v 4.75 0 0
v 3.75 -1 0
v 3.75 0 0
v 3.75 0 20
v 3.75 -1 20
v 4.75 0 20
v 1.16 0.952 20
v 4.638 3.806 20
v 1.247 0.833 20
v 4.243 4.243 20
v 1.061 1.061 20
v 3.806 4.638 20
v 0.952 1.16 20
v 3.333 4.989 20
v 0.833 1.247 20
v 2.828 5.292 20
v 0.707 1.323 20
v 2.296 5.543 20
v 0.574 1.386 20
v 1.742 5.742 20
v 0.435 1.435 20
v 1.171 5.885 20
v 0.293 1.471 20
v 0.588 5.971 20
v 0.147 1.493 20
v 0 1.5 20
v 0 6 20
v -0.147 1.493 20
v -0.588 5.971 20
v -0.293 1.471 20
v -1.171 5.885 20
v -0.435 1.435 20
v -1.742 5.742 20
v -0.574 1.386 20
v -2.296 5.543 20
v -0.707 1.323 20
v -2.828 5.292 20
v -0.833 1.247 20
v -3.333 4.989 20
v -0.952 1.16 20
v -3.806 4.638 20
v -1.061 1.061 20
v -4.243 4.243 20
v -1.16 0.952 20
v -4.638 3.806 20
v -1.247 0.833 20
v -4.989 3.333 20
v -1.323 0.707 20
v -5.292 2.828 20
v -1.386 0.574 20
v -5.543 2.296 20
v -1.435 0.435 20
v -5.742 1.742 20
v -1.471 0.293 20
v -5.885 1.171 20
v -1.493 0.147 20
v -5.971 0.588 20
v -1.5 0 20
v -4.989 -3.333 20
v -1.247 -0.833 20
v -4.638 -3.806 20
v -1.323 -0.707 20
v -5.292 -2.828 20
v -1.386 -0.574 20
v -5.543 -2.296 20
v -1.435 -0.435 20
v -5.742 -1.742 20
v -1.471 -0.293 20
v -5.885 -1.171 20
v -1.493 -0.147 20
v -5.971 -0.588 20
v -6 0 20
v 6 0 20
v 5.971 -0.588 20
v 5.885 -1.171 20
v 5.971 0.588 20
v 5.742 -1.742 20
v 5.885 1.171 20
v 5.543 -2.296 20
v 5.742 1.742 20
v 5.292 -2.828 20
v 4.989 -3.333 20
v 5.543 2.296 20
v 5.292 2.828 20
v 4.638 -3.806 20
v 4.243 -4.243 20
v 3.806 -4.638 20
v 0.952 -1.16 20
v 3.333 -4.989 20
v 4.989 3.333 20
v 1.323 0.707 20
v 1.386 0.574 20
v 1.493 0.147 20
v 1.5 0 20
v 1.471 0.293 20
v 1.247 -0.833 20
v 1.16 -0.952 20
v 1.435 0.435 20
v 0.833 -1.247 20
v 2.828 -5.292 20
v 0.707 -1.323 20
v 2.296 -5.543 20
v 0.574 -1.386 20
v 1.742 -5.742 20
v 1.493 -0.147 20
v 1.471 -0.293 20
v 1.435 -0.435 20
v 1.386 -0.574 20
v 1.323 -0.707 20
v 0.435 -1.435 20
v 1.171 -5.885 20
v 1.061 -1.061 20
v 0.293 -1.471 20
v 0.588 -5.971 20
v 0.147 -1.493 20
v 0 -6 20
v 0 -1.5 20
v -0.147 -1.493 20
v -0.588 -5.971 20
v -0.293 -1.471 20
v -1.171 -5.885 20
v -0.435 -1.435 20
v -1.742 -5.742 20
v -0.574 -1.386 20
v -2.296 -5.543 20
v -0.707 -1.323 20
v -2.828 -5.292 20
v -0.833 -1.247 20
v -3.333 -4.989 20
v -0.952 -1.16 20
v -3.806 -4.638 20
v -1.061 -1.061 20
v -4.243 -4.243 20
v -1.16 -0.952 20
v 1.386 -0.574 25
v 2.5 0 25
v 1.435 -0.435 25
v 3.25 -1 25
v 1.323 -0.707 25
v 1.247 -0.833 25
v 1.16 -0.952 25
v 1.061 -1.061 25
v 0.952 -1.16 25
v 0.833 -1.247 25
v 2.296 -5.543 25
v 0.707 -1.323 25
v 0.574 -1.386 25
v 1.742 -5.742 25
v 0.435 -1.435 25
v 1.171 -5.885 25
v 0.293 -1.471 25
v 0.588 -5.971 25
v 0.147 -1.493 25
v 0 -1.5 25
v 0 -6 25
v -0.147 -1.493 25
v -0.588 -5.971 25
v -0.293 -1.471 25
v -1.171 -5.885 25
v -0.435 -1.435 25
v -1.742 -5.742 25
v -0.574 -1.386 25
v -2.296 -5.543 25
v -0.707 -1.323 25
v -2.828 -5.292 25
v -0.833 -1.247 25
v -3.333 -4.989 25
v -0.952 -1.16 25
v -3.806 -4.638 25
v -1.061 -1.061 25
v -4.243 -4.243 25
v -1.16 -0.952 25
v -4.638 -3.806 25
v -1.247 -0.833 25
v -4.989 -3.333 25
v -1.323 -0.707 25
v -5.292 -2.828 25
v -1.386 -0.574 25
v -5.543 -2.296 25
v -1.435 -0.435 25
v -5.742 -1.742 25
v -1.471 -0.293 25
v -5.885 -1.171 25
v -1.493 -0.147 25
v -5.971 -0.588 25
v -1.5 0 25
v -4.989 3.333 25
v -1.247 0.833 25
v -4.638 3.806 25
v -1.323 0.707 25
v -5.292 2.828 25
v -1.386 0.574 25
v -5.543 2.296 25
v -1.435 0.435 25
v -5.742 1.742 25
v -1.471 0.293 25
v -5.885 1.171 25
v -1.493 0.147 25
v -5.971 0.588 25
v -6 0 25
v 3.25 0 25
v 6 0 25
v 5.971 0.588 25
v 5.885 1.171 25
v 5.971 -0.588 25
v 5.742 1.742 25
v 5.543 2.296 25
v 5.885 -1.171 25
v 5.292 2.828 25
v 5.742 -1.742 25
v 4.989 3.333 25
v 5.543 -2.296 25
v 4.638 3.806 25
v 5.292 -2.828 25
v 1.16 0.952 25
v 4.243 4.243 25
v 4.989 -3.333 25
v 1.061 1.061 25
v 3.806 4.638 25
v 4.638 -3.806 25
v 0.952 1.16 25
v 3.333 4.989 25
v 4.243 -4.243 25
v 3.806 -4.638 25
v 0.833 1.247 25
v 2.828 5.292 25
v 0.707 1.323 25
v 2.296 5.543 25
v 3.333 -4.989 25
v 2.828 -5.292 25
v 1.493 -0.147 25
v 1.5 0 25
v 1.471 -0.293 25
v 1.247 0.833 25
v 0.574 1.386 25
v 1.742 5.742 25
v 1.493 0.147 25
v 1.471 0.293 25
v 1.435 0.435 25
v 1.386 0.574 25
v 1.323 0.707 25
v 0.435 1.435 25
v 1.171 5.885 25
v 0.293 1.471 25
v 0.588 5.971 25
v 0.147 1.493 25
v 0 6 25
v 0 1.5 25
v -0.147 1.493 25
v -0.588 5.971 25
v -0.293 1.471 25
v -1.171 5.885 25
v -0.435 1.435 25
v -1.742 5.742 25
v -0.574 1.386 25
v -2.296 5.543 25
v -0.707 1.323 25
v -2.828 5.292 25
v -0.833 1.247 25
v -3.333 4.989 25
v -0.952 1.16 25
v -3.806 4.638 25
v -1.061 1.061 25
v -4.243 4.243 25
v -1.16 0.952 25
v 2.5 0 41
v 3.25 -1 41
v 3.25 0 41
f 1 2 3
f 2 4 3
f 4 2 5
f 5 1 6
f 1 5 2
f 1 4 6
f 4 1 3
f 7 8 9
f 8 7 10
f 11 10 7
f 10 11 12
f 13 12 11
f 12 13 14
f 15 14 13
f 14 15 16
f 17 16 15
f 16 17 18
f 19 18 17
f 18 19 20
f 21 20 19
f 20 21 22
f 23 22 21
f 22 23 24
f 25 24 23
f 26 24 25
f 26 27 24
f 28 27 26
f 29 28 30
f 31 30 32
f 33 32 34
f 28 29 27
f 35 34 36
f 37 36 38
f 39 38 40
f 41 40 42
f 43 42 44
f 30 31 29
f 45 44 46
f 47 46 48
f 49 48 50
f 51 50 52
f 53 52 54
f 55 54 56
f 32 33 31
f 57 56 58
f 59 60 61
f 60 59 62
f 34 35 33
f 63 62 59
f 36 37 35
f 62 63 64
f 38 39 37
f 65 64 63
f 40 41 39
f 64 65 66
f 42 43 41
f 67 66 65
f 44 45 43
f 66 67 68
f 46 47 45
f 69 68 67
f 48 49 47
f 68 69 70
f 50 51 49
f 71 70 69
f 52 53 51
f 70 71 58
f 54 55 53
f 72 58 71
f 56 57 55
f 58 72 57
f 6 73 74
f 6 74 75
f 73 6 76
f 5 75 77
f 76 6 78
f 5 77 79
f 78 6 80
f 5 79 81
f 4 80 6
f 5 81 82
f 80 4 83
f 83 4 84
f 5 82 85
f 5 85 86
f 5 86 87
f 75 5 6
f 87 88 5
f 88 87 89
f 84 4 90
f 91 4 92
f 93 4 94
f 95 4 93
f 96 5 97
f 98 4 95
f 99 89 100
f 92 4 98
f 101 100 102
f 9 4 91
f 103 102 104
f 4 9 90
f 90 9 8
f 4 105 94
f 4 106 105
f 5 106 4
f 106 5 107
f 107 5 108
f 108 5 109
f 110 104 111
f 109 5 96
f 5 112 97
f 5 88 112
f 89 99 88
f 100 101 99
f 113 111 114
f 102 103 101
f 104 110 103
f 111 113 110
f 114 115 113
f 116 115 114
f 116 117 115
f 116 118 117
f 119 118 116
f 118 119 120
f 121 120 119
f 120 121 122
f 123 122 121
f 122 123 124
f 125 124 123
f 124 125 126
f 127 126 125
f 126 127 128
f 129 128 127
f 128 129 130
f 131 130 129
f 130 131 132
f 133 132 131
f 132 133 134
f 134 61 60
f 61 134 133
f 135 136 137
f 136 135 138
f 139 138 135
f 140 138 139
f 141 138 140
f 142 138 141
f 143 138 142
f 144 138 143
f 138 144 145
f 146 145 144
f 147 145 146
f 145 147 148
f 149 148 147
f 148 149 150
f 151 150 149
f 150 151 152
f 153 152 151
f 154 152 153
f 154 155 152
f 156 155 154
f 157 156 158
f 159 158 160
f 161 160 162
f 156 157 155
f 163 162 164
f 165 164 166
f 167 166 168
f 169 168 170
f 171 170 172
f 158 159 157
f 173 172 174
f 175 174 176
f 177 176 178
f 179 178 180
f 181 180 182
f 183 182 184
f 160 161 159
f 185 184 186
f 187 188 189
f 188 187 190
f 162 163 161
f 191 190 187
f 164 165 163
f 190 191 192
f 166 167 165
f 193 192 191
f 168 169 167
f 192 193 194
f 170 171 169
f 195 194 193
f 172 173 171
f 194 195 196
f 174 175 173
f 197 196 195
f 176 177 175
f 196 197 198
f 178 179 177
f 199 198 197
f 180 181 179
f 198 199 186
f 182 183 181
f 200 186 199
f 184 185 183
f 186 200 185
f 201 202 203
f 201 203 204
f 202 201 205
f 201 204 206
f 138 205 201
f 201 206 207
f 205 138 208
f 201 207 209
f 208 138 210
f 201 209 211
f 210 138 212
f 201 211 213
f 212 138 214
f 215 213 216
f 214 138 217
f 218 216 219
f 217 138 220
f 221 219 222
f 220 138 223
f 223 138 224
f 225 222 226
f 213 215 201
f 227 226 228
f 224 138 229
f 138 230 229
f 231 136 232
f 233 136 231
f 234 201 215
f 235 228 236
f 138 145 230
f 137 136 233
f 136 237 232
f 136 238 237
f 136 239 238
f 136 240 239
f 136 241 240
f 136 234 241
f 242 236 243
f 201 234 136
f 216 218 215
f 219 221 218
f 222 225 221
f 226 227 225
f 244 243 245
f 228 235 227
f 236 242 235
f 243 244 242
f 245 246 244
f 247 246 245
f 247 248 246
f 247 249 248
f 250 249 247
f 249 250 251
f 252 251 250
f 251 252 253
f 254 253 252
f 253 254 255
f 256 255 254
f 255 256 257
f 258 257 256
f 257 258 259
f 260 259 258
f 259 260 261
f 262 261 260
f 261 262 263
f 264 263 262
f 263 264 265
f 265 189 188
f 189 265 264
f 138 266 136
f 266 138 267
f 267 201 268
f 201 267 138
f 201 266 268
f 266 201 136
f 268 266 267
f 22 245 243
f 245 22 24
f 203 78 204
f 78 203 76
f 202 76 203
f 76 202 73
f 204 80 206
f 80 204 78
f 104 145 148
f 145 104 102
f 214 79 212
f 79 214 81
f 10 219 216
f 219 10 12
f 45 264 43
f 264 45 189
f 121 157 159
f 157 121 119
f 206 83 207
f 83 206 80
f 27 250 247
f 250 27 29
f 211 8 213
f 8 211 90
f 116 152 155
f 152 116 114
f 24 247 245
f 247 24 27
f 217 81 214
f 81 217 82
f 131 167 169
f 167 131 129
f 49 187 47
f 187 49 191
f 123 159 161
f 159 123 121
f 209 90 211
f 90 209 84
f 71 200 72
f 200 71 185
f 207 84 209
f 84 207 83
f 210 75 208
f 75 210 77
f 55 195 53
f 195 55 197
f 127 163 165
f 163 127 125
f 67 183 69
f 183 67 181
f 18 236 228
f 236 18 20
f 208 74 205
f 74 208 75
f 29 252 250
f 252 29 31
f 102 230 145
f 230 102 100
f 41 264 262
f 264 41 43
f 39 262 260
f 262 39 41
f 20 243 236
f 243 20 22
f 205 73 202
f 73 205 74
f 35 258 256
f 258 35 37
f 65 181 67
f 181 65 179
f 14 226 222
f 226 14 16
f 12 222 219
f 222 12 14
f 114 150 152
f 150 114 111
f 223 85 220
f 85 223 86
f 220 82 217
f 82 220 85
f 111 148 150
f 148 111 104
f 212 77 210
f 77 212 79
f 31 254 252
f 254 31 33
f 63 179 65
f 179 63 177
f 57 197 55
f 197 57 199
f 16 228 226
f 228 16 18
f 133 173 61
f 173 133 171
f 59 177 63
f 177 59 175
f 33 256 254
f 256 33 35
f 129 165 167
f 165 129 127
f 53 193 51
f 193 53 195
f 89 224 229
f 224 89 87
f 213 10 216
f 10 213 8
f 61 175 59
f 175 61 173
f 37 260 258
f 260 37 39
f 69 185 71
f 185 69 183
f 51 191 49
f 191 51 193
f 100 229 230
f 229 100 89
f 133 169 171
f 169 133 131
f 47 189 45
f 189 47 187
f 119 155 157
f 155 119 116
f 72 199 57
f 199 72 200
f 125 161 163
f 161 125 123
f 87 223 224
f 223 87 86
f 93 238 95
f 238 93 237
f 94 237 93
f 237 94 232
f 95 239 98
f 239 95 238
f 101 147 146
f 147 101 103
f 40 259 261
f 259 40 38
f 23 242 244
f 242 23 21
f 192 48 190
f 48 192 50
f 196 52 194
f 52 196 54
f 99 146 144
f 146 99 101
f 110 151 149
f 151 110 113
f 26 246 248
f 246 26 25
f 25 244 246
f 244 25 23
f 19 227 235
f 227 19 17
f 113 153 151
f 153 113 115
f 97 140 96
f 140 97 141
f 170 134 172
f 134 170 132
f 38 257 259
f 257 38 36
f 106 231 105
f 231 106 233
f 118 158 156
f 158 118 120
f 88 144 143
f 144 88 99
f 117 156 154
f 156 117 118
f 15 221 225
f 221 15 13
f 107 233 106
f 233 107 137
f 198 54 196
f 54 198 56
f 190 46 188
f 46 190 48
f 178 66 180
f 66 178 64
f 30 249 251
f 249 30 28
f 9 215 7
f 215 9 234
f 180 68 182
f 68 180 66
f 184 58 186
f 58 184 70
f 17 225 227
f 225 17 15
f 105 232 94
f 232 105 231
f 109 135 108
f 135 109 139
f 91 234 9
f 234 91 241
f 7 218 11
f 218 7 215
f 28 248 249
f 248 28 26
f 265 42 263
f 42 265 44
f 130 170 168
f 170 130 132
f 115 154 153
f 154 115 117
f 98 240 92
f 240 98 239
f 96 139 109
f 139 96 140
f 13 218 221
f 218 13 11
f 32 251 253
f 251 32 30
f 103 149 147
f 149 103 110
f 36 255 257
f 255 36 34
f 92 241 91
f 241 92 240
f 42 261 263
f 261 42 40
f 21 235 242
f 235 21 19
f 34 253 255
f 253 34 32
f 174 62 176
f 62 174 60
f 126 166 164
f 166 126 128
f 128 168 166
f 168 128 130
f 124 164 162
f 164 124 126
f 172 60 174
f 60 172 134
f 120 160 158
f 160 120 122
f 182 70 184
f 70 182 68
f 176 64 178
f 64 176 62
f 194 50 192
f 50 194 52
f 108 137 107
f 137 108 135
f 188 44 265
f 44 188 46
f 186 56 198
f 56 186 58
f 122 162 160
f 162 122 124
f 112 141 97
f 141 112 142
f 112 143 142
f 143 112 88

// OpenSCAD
// Hose-barb reducer: 8 mm ID -> 5 mm ID
// Print orientation: standing upright along +Z

$fn = 64;

// ---- Dimensions (mm) ----
tube_id_8     = 8;    // 8 mm tubing inner diameter
tube_id_5     = 5;    // 5 mm tubing inner diameter
bore          = 3;    // through-bore diameter
collar_d      = 12;   // reducer collar diameter (z = 20..25)

 Barb_h_8     = 10;   // 8 mm barb height
 Barb_od_8_b  = 7.5;  // 8 mm barb outer diameter (bottom)
 Barb_od_8_t  = 9.5;  // 8 mm barb outer diameter (top)

 Barb_h_5     = 8;    // 5 mm barb height
 Barb_od_5_b  = 6.5;  // 5 mm barb outer diameter (bottom)
 Barb_od_5_t  = 5.0;  // 5 mm barb outer diameter (top)

eps           = 0.5;  // cutter overshoot

// ---- Model ----
difference() {
    union() {
        // 8 mm barbs (z = 0..20)
        for (i = [0 : 1])
            translate([0, 0, i * Barb_h_8])
                linear_extrude(height = Barb_h_8)
                    polygon([
                        [Barb_od_8_b / 2, 0],
                        [Barb_od_8_t / 2, 0],
                        [Barb_od_8_b / 2, -1]
                    ]);

        // Collar (z = 20..25)
        translate([0, 0, 20])
            cylinder(d = collar_d, h = 5);

        // 5 mm barbs (z = 25..41)
        for (i = [0 : 1])
            translate([0, 0, 25 + i * Barb_h_5])
                linear_extrude(height = Barb_h_5)
                    polygon([
                        [Barb_od_5_b / 2, 0],
                        [Barb_od_5_t / 2, 0],
                        [Barb_od_5_b / 2, -1]
                    ]);
    }

    // Through-bore
    translate([0, 0, -eps])
        cylinder(d = bore, h = 42 + 2 * eps);
}
